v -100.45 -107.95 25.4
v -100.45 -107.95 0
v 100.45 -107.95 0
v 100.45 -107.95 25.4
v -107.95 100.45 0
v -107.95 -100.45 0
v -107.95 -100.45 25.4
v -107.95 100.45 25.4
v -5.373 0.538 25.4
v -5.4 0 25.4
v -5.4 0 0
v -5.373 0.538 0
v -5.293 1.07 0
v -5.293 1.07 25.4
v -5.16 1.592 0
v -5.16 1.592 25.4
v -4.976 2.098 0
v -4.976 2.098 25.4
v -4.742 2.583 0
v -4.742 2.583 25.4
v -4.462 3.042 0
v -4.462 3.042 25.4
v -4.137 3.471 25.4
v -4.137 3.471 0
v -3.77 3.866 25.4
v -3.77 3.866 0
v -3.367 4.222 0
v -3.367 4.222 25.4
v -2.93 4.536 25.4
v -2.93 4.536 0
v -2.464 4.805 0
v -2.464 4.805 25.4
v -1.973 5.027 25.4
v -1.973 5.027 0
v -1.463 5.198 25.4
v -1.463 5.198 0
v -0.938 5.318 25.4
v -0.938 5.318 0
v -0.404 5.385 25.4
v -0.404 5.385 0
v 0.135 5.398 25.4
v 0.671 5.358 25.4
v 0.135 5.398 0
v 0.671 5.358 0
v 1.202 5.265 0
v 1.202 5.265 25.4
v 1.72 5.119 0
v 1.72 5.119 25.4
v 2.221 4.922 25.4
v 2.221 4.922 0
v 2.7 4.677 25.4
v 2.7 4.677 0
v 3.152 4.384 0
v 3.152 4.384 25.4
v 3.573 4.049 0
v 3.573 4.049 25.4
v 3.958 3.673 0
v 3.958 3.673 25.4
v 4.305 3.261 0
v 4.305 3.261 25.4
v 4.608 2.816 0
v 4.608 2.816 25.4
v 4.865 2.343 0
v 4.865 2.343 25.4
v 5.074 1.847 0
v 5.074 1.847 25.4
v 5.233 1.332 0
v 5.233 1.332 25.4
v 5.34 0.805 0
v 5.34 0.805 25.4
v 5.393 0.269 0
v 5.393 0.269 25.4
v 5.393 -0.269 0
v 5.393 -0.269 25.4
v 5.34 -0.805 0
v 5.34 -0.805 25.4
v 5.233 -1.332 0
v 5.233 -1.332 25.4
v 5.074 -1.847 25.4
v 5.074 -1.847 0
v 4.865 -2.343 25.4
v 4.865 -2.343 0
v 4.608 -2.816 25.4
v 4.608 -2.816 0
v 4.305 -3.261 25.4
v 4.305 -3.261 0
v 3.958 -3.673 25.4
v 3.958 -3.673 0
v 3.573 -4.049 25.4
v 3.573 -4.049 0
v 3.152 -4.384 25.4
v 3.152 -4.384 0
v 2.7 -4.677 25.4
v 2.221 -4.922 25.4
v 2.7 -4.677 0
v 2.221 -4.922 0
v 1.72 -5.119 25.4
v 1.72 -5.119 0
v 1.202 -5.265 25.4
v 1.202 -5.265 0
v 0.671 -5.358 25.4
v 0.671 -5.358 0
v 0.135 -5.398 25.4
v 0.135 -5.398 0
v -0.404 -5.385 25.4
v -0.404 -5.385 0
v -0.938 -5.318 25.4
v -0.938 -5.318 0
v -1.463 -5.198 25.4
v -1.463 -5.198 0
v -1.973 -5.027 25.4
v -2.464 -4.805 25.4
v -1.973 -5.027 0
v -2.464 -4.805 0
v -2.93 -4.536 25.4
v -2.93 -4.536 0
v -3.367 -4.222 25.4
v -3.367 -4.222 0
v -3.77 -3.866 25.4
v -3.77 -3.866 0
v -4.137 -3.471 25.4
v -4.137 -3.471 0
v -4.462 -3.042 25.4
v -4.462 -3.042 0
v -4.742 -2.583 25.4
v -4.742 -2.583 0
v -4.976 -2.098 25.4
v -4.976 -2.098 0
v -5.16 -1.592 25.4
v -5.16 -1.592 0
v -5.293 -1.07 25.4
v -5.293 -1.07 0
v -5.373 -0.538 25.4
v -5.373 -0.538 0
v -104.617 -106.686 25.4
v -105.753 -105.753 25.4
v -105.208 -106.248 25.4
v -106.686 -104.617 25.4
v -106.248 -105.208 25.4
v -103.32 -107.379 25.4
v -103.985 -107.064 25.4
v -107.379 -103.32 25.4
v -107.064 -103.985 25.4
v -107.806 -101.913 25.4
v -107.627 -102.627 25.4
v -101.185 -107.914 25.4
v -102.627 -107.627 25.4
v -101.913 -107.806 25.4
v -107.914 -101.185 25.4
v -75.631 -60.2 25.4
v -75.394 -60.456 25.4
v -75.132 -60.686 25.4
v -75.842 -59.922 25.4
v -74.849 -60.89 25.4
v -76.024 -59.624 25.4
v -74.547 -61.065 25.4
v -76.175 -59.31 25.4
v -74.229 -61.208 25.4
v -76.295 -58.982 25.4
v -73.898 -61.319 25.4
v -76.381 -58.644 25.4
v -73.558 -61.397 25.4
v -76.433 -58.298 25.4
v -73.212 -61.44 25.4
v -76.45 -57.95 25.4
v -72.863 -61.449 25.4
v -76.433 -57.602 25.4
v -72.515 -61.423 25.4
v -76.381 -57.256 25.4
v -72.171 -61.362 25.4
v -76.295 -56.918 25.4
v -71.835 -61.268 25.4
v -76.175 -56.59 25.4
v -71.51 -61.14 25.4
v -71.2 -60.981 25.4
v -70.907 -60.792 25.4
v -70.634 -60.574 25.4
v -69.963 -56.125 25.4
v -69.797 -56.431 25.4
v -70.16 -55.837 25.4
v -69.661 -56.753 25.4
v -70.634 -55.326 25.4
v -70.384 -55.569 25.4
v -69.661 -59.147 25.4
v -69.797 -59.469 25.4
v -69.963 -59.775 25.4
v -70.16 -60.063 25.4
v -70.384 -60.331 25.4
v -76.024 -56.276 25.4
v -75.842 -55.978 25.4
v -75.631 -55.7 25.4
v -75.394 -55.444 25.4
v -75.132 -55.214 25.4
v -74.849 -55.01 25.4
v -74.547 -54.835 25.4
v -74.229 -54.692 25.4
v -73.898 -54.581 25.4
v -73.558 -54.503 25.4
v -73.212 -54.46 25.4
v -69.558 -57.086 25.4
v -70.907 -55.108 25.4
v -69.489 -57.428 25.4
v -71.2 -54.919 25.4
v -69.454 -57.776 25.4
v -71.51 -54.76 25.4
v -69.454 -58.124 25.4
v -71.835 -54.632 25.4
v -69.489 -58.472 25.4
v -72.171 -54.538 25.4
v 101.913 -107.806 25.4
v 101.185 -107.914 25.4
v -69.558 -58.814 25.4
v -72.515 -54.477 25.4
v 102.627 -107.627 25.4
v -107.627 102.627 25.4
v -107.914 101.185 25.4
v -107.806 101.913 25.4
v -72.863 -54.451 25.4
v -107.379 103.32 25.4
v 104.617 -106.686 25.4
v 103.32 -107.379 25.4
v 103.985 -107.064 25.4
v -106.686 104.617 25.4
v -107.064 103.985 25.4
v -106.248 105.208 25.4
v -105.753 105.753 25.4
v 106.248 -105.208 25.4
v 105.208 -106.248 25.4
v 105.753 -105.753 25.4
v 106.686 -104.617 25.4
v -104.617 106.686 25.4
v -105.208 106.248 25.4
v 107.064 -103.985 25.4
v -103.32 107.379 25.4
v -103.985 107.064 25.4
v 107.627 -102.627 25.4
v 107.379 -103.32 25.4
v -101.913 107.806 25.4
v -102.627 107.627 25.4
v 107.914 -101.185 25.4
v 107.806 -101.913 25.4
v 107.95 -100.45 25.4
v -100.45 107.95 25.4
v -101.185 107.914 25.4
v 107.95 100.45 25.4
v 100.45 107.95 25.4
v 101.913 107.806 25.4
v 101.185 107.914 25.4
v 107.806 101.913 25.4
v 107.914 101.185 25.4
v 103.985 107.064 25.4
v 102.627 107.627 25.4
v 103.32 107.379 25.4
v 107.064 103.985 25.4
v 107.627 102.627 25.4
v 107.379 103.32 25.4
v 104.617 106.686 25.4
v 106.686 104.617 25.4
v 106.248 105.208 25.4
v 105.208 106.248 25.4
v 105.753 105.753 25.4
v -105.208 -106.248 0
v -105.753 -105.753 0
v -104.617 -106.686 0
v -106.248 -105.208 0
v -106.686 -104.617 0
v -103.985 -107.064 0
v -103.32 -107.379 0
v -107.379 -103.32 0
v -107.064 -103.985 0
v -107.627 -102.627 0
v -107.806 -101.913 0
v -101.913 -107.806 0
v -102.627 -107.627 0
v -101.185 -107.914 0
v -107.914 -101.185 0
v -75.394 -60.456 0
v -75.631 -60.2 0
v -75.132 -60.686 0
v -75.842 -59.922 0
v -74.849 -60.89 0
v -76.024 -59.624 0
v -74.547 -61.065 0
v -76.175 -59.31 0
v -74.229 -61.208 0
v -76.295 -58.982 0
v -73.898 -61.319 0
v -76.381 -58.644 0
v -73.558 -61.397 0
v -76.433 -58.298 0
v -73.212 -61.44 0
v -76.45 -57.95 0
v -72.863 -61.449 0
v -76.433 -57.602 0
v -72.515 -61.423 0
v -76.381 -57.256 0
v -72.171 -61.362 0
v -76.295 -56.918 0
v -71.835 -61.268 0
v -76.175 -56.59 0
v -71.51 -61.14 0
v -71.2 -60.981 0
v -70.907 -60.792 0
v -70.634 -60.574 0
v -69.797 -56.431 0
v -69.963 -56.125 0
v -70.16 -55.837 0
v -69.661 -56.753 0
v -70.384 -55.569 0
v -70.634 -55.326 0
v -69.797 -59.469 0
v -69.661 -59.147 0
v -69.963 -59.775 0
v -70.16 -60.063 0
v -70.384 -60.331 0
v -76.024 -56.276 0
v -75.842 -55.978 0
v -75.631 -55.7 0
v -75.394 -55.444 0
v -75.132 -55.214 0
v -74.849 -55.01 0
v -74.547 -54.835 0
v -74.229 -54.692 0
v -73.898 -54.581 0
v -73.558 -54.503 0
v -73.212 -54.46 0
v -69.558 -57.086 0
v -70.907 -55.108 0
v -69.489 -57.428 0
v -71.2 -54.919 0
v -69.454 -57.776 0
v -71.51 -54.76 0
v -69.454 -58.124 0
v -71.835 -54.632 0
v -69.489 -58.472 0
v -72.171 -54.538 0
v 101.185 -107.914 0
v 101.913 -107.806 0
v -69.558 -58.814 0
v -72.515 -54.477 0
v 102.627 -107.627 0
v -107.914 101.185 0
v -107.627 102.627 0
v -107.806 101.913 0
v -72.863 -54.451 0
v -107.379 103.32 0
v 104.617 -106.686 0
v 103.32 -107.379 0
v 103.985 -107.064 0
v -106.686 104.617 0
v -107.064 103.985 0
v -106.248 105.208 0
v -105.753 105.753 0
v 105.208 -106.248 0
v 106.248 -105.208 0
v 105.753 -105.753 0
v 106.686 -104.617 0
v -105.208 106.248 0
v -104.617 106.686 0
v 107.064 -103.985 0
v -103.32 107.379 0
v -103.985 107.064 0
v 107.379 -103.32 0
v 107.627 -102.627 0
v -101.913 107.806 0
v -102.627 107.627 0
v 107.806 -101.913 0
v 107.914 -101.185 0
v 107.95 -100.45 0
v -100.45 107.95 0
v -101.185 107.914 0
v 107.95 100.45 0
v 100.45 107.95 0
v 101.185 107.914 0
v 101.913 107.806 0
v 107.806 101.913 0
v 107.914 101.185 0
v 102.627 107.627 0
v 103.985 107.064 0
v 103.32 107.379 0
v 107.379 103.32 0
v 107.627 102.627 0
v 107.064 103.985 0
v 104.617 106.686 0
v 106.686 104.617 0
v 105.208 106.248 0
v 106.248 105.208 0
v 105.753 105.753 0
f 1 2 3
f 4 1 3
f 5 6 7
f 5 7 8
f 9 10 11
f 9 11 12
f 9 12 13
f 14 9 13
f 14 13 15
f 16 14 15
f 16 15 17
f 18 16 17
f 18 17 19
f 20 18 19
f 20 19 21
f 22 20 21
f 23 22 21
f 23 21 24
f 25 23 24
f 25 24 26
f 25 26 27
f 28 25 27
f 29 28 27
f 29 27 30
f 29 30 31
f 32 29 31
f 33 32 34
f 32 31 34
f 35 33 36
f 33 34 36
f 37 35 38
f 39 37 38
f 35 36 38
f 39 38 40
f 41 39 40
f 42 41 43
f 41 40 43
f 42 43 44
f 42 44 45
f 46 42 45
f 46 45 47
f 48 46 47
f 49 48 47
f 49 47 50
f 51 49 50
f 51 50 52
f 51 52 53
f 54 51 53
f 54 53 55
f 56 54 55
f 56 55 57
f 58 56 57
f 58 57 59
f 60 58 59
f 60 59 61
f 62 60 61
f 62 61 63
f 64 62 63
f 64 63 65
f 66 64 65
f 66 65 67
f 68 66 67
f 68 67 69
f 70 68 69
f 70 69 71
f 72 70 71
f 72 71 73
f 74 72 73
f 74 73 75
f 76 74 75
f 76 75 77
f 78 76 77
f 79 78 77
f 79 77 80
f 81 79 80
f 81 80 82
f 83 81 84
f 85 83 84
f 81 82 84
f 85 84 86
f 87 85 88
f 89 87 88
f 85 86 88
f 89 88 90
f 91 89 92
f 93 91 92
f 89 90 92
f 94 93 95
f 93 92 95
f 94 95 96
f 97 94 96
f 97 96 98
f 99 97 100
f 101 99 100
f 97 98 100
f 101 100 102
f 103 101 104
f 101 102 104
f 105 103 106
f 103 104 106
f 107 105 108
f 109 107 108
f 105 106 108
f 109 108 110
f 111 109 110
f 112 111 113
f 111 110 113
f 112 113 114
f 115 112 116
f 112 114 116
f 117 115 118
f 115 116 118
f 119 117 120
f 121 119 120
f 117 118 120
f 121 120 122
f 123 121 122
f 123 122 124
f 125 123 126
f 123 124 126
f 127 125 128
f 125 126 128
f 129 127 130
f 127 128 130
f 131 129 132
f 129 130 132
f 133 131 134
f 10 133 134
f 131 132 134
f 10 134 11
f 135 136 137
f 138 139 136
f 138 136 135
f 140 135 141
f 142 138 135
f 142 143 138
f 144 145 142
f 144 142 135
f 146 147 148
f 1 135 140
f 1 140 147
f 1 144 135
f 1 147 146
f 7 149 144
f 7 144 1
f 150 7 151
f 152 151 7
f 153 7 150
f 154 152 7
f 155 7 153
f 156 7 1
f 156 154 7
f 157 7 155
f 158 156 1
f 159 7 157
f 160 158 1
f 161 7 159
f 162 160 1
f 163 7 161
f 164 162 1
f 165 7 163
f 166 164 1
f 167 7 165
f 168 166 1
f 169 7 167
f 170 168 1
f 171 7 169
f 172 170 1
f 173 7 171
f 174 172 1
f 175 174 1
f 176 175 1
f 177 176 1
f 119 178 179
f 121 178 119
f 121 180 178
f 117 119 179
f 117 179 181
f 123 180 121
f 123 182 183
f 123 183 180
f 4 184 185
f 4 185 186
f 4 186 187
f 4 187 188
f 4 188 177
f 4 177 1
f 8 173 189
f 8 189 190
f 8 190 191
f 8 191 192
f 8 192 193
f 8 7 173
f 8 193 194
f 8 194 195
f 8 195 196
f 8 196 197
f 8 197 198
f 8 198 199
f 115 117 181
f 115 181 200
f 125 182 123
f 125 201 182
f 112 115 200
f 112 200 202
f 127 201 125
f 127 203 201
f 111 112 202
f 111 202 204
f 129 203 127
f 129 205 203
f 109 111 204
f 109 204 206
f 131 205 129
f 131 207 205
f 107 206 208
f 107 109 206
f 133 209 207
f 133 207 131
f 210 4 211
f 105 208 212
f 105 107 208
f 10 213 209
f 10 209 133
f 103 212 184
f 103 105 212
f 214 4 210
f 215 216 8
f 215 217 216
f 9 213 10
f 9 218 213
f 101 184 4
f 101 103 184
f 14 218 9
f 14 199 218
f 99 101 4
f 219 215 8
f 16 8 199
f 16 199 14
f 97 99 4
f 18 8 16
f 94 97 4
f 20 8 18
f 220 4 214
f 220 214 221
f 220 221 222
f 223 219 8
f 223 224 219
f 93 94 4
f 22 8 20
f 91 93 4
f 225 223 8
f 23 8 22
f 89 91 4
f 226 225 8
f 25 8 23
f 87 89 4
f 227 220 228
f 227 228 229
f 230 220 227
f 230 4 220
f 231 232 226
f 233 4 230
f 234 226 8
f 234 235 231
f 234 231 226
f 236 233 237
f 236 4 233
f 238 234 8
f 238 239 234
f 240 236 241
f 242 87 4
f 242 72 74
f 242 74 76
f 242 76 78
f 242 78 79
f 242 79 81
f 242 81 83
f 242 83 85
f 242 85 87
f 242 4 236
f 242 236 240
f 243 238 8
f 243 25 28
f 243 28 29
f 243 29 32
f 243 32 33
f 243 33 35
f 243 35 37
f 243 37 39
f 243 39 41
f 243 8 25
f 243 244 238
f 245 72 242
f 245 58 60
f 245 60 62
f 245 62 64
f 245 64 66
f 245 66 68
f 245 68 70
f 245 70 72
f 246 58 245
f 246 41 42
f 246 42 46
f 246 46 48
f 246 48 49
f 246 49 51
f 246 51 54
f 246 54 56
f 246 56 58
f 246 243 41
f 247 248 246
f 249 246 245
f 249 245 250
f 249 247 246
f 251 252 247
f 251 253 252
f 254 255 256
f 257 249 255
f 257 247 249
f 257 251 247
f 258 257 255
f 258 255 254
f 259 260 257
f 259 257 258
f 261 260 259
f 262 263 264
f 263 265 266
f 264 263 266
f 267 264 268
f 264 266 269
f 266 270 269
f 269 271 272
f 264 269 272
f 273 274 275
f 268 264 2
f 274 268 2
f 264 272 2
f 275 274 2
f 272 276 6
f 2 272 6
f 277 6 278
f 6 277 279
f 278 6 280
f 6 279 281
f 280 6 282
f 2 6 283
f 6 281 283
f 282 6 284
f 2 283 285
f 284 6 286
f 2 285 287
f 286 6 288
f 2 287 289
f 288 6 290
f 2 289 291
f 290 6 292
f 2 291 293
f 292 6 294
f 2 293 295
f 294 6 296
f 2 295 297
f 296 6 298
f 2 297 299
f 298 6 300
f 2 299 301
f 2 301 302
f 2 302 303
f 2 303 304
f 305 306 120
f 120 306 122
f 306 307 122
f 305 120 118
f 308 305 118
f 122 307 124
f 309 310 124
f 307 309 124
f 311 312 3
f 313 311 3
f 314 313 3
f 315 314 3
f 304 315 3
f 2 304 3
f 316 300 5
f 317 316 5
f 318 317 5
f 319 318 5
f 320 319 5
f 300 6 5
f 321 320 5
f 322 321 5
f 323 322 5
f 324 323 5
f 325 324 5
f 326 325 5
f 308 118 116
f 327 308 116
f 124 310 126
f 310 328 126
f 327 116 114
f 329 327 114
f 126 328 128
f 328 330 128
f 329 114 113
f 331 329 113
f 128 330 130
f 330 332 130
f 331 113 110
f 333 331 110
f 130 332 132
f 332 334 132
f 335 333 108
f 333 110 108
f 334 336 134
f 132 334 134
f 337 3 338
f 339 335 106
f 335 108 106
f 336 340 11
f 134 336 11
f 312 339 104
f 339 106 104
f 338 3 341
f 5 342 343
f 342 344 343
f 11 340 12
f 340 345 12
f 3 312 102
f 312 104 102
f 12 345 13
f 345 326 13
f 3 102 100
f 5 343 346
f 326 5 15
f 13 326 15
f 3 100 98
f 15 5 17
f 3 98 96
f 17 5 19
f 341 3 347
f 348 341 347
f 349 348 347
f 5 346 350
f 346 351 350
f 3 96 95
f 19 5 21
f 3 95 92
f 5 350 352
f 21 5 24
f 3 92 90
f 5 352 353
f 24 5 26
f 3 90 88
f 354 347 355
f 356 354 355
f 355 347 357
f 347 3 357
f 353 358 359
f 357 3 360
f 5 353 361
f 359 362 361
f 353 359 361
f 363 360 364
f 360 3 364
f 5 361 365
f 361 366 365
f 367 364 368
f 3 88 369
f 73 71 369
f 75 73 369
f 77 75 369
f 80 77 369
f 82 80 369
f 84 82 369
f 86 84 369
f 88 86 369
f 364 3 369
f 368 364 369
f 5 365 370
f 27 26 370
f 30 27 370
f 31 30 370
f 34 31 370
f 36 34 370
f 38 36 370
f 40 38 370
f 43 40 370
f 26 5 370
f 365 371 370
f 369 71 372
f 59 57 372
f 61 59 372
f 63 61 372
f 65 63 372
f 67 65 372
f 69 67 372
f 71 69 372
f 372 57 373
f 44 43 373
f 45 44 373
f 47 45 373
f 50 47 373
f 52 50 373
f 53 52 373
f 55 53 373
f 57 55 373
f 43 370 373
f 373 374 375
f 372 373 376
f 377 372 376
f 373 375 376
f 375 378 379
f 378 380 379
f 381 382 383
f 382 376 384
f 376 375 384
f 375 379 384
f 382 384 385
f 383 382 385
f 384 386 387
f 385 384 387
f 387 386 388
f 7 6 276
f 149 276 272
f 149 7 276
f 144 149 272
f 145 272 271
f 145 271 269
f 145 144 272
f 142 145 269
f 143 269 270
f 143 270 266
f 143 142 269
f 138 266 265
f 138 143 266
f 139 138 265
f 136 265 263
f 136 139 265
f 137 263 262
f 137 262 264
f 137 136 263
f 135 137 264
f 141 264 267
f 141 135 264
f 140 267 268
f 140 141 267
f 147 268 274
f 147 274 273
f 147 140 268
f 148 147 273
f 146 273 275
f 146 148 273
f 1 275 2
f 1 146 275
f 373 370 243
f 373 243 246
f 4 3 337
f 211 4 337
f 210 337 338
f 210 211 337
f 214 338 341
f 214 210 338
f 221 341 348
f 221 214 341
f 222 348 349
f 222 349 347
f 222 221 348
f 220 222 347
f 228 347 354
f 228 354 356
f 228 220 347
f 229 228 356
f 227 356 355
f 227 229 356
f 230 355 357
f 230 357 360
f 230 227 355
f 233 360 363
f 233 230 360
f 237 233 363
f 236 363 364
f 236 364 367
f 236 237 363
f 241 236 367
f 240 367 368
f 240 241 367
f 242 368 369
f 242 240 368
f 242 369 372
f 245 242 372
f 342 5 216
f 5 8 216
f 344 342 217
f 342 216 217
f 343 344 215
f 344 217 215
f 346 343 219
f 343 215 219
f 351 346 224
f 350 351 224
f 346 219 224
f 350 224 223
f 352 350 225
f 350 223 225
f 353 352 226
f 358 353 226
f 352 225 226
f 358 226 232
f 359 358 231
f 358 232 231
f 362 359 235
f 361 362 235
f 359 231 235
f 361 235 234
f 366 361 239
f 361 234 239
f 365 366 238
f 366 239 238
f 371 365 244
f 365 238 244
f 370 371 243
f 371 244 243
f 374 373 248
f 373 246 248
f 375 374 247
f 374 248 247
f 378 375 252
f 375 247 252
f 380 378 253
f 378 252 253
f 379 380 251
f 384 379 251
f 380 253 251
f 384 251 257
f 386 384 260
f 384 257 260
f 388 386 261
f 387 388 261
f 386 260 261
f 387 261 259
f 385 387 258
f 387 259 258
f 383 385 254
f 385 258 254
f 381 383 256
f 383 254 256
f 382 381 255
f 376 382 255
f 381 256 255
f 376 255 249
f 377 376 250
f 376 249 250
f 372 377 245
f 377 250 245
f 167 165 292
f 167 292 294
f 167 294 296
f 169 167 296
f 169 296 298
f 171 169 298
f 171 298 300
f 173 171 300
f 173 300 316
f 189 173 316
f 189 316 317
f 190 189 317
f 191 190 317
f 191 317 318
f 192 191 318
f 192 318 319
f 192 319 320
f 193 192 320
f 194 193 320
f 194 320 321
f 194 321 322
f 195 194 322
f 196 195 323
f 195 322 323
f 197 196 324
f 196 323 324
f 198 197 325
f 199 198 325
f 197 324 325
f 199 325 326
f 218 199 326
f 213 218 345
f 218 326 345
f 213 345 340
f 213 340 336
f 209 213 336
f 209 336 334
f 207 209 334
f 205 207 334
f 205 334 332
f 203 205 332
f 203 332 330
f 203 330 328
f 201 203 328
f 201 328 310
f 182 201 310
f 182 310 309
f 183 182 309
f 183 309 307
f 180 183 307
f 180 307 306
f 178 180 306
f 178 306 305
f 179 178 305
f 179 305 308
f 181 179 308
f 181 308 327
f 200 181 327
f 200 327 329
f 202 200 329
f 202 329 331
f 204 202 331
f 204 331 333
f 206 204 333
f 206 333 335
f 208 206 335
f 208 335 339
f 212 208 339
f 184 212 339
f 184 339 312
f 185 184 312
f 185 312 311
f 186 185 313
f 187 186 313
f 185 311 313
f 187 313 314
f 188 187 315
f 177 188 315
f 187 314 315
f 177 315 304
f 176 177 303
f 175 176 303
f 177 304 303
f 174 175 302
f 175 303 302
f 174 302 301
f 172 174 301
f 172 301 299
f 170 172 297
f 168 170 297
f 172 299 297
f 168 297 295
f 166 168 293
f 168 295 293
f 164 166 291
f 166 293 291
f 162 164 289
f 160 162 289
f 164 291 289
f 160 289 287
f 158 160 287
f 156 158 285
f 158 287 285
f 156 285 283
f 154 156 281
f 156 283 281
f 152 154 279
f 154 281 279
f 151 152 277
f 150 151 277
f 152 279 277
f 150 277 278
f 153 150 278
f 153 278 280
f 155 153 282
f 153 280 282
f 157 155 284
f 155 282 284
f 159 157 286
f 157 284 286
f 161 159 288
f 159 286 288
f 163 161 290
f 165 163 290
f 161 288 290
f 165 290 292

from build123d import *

# Parameters (mm, degrees)
F0_W     = 215.9
F0_H     = 215.9
F1_DEPTH = 25.4
F3_D     = 10.8
F4_R     = 7.5
F6_D     = 7


with BuildPart() as f1:
    # F0 (on Top) → F1 (new body)
    with BuildSketch(Plane.XY):
        Rectangle(F0_W, F0_H)
    extrude(amount=F1_DEPTH)

    # F3 (through all)
    with Locations(Plane.XY.offset(25.4)):
        with Locations((0, 0)):
            Hole(F3_D / 2)

    # F4
    f4_edges = [f1.edges().sort_by_distance(p)[0] for p in [
        (-107.95, -107.95, 12.7),
        (107.95, -107.95, 12.7),
        (107.95, 107.95, 12.7),
        (-107.95, 107.95, 12.7),
    ]]
    fillet(f4_edges, radius=F4_R)

    # F6 (through all)
    with Locations(Plane.XY.offset(25.4)):
        with Locations((-72.95, -57.95)):
            Hole(F6_D / 2)


solid = f1.part
